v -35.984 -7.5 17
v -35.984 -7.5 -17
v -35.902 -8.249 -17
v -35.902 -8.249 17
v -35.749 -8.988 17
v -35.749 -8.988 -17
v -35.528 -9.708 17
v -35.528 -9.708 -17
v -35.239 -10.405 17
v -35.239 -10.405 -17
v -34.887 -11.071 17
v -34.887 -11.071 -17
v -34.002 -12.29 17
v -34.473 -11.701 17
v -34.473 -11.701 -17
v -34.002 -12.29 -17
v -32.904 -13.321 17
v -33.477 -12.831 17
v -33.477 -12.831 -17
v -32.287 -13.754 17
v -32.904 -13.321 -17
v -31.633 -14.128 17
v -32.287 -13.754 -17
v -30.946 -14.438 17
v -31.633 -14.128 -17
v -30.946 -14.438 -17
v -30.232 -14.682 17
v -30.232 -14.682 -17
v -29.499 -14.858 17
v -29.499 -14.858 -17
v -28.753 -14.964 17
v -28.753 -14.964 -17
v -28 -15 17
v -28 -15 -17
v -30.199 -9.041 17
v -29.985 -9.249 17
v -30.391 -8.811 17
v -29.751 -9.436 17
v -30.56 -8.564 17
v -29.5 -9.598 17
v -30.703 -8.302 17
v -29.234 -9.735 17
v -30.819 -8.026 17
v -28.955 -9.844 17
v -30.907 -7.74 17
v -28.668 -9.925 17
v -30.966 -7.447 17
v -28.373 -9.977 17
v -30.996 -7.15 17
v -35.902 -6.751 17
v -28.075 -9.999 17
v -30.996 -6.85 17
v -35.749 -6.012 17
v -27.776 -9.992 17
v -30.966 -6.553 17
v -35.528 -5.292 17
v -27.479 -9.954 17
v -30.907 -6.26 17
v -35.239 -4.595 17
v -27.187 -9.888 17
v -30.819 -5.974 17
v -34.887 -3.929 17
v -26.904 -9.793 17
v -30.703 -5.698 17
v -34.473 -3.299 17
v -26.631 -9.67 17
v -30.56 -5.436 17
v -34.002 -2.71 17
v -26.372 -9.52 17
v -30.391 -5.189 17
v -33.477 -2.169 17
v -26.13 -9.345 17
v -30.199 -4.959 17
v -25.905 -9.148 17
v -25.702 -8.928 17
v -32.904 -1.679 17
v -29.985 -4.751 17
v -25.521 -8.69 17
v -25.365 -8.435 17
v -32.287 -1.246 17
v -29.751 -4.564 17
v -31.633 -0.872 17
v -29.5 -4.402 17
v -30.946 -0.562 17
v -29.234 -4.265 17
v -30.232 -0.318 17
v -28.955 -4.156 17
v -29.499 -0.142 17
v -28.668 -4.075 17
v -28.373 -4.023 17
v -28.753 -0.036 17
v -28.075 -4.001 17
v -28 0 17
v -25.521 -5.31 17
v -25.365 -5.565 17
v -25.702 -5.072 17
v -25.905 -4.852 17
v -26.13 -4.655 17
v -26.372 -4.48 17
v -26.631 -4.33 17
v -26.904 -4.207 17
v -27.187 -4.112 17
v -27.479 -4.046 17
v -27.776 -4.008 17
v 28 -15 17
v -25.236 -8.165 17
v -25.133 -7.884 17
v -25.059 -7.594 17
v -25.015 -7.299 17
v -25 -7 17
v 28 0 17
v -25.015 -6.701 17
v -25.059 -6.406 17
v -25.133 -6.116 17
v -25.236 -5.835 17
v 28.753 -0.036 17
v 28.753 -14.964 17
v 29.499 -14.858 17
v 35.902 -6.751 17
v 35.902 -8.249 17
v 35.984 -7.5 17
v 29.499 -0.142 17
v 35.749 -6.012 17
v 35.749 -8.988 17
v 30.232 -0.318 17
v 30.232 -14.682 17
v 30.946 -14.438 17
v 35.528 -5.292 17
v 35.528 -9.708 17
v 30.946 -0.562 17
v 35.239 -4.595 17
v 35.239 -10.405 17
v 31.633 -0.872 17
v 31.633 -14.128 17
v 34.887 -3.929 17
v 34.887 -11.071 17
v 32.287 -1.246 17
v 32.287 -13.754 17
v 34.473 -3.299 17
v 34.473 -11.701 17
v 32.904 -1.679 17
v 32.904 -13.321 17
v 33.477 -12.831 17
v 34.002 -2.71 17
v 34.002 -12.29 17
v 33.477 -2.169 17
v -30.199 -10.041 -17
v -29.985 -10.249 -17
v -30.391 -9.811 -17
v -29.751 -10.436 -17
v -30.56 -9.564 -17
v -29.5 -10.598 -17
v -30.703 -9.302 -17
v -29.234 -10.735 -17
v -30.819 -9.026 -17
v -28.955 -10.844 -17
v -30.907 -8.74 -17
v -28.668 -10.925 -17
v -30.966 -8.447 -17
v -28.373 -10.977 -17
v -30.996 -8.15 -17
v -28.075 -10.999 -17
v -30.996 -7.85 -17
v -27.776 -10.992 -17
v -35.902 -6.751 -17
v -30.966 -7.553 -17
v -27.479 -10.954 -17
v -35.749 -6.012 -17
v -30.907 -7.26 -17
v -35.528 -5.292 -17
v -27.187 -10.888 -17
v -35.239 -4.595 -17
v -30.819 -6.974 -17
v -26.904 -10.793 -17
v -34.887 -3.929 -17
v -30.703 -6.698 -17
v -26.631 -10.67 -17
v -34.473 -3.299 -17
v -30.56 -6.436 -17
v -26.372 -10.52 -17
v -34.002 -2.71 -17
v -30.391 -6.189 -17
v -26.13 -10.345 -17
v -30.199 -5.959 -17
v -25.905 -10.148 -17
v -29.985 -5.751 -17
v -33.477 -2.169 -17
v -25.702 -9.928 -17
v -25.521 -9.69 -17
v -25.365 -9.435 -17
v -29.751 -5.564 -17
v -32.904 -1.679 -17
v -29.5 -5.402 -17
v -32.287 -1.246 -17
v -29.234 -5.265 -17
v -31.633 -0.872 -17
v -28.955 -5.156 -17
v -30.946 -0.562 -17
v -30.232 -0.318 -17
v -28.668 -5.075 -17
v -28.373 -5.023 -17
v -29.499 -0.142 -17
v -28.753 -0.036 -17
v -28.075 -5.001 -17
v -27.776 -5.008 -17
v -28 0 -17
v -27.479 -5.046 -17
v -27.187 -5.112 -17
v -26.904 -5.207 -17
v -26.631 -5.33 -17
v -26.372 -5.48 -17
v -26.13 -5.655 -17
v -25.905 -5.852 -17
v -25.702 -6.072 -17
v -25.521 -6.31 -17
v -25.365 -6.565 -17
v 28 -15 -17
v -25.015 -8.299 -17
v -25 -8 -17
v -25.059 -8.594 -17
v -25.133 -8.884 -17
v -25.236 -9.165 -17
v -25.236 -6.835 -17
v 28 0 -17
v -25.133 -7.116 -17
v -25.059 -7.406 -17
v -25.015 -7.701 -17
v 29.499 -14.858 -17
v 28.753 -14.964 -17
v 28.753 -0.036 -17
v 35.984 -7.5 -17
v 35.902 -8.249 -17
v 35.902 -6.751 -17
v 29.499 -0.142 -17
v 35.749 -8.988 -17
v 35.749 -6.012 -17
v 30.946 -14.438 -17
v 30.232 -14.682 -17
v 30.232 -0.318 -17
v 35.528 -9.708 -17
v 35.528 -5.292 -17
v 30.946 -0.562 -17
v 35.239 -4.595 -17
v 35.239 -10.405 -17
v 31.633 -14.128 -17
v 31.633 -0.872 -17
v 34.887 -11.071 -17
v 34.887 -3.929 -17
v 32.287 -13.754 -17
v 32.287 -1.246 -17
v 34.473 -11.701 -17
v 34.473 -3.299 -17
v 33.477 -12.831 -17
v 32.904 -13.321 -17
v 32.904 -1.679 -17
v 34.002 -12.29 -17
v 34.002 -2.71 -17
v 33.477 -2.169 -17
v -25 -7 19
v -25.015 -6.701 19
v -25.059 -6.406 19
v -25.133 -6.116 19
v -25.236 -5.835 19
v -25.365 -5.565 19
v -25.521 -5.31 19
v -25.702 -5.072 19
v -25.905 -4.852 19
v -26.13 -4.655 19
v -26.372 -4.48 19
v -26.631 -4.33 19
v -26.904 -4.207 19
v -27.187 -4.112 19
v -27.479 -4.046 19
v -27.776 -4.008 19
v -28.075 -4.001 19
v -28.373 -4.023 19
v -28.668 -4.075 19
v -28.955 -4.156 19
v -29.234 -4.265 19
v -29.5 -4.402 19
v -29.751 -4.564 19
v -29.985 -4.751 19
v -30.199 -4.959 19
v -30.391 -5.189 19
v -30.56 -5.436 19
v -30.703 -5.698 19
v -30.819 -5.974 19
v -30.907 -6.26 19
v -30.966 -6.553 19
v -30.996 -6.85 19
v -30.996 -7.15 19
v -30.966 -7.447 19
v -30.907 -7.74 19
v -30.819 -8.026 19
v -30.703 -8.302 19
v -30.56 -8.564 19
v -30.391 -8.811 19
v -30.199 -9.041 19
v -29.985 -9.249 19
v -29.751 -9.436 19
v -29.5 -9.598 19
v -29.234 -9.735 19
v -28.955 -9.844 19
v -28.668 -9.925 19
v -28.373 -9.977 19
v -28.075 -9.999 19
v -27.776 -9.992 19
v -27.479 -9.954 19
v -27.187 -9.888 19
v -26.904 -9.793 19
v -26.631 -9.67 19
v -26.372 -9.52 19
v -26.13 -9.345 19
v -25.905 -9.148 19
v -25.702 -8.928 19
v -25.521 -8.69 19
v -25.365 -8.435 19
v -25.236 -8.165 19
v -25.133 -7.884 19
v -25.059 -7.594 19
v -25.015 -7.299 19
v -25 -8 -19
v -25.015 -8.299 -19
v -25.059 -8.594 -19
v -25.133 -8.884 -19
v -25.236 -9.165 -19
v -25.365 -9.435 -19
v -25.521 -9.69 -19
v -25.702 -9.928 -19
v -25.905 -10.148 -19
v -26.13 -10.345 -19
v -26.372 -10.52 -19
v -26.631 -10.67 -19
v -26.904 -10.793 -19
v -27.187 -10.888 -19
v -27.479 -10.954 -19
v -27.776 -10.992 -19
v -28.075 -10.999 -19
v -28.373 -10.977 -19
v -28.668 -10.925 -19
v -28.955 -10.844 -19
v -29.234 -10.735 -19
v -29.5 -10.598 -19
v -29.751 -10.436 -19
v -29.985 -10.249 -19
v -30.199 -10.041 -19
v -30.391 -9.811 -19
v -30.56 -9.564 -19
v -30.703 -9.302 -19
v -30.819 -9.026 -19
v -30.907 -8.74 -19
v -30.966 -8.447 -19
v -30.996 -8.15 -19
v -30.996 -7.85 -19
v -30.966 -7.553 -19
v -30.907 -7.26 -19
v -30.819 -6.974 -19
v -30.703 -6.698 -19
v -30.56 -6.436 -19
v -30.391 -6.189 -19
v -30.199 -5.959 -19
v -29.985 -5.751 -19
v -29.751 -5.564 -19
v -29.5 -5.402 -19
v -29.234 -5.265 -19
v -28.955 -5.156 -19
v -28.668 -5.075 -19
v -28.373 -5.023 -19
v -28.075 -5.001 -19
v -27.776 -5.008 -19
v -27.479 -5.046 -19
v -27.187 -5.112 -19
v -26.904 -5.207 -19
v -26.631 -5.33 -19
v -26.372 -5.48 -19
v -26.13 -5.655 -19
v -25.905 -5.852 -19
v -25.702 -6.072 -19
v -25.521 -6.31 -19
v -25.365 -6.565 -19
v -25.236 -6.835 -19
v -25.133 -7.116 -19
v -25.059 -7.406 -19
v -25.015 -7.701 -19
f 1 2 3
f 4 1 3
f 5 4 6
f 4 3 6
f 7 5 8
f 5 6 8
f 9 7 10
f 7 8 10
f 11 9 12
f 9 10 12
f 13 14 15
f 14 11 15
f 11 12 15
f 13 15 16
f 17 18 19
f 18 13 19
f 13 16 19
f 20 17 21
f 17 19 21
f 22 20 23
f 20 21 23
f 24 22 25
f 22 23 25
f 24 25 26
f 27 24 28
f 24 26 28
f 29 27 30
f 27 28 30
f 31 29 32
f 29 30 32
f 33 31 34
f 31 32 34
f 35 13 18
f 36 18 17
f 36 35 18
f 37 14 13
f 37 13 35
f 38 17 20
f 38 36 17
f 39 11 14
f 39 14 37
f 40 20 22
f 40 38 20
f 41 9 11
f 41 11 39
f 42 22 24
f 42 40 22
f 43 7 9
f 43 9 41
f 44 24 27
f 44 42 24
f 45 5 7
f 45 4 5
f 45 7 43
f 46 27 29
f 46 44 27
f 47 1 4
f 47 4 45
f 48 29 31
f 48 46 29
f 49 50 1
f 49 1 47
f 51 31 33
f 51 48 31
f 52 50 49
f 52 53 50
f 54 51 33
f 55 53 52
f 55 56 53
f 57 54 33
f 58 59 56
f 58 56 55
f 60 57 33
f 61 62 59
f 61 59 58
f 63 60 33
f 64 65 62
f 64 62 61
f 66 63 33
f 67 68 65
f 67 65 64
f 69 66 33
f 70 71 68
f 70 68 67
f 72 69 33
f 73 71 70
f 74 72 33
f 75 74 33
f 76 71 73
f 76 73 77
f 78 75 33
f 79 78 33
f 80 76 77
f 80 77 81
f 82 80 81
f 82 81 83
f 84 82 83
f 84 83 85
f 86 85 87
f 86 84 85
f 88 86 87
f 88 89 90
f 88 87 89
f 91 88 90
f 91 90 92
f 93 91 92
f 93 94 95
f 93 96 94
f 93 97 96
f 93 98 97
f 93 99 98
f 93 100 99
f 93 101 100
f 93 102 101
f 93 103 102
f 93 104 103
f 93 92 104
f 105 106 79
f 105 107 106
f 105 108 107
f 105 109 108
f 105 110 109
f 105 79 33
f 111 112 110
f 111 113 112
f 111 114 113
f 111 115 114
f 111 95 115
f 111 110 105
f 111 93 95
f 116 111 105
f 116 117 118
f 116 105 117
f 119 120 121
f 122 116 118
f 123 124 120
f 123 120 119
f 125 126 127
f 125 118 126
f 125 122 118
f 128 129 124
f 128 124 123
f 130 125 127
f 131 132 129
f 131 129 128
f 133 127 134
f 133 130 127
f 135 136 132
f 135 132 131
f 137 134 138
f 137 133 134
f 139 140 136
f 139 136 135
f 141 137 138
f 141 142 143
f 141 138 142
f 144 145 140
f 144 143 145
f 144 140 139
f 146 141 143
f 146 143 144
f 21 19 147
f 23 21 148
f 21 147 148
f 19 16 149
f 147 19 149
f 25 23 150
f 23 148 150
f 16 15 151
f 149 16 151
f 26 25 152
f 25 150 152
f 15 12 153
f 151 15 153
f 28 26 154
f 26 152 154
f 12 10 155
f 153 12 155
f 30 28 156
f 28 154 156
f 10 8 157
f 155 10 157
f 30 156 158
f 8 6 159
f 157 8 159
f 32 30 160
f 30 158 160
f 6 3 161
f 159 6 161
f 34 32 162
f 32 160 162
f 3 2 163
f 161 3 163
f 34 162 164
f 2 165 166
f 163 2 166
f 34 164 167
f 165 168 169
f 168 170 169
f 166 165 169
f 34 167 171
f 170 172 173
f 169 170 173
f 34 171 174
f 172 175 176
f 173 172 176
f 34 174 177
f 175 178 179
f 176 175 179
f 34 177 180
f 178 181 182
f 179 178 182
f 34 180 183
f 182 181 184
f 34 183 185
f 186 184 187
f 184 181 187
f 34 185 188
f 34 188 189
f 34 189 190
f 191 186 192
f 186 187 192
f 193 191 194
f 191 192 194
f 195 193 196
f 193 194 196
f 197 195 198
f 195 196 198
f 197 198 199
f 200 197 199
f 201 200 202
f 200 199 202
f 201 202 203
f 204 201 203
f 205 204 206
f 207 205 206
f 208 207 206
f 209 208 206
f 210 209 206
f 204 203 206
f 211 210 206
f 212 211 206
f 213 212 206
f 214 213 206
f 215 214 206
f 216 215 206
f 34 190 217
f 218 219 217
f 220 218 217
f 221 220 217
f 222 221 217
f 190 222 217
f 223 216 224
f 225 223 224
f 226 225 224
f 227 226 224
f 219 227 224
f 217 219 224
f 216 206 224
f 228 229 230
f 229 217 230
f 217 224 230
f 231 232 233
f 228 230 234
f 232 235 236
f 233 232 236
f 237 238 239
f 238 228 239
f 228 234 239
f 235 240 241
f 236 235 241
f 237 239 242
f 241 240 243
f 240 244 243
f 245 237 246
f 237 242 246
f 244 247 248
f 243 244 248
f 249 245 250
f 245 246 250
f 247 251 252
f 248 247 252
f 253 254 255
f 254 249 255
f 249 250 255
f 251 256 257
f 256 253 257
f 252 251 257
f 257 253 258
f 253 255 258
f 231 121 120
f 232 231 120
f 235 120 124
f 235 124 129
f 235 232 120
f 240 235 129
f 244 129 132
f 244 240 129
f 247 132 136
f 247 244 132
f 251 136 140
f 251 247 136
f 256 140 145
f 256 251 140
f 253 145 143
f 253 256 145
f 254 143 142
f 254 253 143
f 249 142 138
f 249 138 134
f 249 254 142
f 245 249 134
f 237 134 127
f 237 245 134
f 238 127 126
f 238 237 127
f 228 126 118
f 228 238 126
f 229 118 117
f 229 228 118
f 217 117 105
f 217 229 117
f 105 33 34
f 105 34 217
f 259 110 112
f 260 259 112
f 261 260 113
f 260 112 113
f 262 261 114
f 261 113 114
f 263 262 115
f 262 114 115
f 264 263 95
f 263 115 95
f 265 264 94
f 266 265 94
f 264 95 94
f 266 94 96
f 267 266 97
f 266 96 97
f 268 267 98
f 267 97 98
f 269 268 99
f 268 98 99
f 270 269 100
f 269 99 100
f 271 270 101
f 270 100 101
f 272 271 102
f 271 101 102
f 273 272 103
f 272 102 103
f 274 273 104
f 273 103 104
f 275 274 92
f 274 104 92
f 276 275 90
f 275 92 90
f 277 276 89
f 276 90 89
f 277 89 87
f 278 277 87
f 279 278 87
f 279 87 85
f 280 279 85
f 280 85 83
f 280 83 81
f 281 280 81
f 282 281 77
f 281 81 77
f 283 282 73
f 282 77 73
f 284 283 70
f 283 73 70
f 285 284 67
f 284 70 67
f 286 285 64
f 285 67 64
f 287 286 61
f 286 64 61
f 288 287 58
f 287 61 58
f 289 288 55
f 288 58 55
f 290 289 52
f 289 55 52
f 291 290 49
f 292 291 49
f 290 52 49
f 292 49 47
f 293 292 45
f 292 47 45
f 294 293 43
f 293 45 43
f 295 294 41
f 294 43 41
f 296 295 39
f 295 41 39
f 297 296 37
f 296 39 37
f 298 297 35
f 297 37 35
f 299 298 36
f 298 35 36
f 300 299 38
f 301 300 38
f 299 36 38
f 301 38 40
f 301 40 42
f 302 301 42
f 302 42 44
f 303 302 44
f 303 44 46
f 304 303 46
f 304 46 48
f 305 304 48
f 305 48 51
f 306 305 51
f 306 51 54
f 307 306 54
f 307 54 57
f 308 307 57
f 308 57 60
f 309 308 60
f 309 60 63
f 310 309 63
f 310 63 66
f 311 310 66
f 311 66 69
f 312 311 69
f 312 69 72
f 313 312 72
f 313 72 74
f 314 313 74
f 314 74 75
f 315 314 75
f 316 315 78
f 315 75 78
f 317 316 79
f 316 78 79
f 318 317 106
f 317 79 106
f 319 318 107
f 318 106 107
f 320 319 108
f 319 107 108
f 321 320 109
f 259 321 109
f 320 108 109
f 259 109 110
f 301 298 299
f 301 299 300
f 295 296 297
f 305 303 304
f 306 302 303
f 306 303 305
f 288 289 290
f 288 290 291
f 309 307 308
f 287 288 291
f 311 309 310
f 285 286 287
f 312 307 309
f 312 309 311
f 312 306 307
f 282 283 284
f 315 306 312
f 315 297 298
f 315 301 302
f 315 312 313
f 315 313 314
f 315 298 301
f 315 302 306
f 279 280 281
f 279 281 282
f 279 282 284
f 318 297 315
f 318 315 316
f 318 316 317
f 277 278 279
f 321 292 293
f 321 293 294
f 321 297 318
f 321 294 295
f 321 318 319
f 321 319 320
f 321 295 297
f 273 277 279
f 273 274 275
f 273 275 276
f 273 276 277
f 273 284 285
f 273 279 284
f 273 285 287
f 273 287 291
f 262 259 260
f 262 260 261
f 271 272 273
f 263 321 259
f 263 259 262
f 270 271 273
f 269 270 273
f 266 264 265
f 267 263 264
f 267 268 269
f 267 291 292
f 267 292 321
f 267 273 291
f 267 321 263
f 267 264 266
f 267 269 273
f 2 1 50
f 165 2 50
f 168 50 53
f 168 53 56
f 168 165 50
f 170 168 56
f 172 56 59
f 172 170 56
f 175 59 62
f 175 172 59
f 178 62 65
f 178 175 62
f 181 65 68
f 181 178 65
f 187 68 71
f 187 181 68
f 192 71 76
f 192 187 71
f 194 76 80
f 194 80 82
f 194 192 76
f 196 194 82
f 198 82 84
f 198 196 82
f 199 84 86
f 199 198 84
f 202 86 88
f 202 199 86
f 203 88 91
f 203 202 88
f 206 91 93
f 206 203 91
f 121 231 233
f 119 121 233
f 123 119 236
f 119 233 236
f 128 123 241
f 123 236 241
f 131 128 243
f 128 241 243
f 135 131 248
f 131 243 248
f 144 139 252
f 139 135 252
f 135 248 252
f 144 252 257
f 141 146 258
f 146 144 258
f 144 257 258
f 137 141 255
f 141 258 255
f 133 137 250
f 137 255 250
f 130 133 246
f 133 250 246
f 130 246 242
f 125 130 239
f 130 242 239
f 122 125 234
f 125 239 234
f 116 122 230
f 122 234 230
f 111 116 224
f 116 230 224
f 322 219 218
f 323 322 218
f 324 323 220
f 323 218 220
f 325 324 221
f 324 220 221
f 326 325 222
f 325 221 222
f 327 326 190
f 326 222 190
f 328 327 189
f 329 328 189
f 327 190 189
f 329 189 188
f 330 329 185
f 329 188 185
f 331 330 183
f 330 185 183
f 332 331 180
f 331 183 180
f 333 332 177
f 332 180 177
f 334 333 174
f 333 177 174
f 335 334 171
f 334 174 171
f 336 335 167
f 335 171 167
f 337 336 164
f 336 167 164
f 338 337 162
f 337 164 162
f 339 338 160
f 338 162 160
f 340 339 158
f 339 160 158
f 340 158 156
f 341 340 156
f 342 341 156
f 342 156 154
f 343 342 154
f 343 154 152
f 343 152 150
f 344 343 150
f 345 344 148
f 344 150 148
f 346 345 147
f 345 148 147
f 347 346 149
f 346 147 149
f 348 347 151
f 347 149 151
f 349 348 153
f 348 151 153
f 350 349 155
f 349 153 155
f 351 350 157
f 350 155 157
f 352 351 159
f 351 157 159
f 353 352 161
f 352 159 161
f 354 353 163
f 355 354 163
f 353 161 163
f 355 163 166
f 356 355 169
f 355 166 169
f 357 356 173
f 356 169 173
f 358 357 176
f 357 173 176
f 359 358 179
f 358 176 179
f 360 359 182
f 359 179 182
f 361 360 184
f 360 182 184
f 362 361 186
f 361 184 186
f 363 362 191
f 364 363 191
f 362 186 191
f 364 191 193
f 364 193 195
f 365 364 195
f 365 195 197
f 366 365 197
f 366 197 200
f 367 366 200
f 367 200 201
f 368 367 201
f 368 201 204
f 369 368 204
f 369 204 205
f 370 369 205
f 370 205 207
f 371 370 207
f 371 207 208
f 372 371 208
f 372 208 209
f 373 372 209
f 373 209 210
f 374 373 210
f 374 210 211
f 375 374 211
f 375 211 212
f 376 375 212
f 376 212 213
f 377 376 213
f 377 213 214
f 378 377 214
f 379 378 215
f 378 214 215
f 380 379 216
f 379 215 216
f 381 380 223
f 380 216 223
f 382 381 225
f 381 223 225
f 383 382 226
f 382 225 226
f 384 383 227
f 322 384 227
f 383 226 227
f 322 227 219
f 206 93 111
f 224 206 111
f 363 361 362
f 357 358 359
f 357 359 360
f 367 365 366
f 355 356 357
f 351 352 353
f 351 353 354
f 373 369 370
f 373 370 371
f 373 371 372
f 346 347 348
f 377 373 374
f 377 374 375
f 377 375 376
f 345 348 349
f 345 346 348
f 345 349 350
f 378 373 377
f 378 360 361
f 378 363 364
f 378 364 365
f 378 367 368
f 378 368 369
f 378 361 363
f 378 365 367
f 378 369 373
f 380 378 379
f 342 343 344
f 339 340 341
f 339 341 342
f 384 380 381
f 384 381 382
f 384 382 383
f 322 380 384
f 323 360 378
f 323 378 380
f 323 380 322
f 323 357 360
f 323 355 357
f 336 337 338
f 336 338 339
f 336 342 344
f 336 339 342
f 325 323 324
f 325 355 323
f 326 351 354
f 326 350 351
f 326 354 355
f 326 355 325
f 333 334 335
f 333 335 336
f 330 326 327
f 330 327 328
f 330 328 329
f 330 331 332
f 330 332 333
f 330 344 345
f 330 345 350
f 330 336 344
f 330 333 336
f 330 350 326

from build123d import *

# Parameters (mm, degrees)
F0_W        = 72
F0_H        = 34
F1_DEPTH    = 15
F2_T1_DEPTH = 74
F3_R        = 3
F4_DEPTH    = 2
F5_R        = 3
F6_DEPTH    = 2


# Not quite as in the source:
# - a fillet or chamfer that OpenCascade refuses, or shapes differently, is made with other operations: its cross-section is extruded or revolved along the edge and cut away or added


with BuildPart() as f1:
    # F0 (on Front) → F1 (new body)
    with BuildSketch(Plane.XZ):
        Rectangle(F0_W, F0_H)
    extrude(amount=F1_DEPTH)

    # F2: fillet of radius 8 on 4 edges, made by hand

    # F2_s2 → F2_t1 (cut)
    with BuildSketch(Plane.XY.offset(-37)):
        with BuildLine():
            ThreePointArc((-36, -8), (-33.6568542495, -2.3431457505), (-28, 0))
            Line((-28, 0), (-36, 0))
            Line((-36, 0), (-36, -8))
        make_face()
        with BuildLine():
            ThreePointArc((-36, -7), (-33.6568542495, -12.6568542495), (-28, -15))
            Line((-28, -15), (-36, -15))
            Line((-36, -15), (-36, -7))
        make_face()
        with BuildLine():
            ThreePointArc((36, -7), (33.6568542495, -12.6568542495), (28, -15))
            Line((28, -15), (36, -15))
            Line((36, -15), (36, -7))
        make_face()
        with BuildLine():
            ThreePointArc((36, -8), (33.6568542495, -2.3431457505), (28, 0))
            Line((28, 0), (36, 0))
            Line((36, 0), (36, -8))
        make_face()
    extrude(amount=F2_T1_DEPTH, mode=Mode.SUBTRACT)

    # F3 (on face) → F4 (join)
    with BuildSketch(Plane.XY.offset(17)):
        with Locations((-28, -7)):
            Circle(F3_R)
    extrude(amount=F4_DEPTH)

    # F5 (on face) → F6 (join)
    with BuildSketch(Plane(origin=(0, 0, -17), x_dir=(1, 0, 0), z_dir=(0, 0, -1))):
        with Locations((-28, 8)):
            Circle(F5_R)
    extrude(amount=F6_DEPTH)


solid = f1.part
